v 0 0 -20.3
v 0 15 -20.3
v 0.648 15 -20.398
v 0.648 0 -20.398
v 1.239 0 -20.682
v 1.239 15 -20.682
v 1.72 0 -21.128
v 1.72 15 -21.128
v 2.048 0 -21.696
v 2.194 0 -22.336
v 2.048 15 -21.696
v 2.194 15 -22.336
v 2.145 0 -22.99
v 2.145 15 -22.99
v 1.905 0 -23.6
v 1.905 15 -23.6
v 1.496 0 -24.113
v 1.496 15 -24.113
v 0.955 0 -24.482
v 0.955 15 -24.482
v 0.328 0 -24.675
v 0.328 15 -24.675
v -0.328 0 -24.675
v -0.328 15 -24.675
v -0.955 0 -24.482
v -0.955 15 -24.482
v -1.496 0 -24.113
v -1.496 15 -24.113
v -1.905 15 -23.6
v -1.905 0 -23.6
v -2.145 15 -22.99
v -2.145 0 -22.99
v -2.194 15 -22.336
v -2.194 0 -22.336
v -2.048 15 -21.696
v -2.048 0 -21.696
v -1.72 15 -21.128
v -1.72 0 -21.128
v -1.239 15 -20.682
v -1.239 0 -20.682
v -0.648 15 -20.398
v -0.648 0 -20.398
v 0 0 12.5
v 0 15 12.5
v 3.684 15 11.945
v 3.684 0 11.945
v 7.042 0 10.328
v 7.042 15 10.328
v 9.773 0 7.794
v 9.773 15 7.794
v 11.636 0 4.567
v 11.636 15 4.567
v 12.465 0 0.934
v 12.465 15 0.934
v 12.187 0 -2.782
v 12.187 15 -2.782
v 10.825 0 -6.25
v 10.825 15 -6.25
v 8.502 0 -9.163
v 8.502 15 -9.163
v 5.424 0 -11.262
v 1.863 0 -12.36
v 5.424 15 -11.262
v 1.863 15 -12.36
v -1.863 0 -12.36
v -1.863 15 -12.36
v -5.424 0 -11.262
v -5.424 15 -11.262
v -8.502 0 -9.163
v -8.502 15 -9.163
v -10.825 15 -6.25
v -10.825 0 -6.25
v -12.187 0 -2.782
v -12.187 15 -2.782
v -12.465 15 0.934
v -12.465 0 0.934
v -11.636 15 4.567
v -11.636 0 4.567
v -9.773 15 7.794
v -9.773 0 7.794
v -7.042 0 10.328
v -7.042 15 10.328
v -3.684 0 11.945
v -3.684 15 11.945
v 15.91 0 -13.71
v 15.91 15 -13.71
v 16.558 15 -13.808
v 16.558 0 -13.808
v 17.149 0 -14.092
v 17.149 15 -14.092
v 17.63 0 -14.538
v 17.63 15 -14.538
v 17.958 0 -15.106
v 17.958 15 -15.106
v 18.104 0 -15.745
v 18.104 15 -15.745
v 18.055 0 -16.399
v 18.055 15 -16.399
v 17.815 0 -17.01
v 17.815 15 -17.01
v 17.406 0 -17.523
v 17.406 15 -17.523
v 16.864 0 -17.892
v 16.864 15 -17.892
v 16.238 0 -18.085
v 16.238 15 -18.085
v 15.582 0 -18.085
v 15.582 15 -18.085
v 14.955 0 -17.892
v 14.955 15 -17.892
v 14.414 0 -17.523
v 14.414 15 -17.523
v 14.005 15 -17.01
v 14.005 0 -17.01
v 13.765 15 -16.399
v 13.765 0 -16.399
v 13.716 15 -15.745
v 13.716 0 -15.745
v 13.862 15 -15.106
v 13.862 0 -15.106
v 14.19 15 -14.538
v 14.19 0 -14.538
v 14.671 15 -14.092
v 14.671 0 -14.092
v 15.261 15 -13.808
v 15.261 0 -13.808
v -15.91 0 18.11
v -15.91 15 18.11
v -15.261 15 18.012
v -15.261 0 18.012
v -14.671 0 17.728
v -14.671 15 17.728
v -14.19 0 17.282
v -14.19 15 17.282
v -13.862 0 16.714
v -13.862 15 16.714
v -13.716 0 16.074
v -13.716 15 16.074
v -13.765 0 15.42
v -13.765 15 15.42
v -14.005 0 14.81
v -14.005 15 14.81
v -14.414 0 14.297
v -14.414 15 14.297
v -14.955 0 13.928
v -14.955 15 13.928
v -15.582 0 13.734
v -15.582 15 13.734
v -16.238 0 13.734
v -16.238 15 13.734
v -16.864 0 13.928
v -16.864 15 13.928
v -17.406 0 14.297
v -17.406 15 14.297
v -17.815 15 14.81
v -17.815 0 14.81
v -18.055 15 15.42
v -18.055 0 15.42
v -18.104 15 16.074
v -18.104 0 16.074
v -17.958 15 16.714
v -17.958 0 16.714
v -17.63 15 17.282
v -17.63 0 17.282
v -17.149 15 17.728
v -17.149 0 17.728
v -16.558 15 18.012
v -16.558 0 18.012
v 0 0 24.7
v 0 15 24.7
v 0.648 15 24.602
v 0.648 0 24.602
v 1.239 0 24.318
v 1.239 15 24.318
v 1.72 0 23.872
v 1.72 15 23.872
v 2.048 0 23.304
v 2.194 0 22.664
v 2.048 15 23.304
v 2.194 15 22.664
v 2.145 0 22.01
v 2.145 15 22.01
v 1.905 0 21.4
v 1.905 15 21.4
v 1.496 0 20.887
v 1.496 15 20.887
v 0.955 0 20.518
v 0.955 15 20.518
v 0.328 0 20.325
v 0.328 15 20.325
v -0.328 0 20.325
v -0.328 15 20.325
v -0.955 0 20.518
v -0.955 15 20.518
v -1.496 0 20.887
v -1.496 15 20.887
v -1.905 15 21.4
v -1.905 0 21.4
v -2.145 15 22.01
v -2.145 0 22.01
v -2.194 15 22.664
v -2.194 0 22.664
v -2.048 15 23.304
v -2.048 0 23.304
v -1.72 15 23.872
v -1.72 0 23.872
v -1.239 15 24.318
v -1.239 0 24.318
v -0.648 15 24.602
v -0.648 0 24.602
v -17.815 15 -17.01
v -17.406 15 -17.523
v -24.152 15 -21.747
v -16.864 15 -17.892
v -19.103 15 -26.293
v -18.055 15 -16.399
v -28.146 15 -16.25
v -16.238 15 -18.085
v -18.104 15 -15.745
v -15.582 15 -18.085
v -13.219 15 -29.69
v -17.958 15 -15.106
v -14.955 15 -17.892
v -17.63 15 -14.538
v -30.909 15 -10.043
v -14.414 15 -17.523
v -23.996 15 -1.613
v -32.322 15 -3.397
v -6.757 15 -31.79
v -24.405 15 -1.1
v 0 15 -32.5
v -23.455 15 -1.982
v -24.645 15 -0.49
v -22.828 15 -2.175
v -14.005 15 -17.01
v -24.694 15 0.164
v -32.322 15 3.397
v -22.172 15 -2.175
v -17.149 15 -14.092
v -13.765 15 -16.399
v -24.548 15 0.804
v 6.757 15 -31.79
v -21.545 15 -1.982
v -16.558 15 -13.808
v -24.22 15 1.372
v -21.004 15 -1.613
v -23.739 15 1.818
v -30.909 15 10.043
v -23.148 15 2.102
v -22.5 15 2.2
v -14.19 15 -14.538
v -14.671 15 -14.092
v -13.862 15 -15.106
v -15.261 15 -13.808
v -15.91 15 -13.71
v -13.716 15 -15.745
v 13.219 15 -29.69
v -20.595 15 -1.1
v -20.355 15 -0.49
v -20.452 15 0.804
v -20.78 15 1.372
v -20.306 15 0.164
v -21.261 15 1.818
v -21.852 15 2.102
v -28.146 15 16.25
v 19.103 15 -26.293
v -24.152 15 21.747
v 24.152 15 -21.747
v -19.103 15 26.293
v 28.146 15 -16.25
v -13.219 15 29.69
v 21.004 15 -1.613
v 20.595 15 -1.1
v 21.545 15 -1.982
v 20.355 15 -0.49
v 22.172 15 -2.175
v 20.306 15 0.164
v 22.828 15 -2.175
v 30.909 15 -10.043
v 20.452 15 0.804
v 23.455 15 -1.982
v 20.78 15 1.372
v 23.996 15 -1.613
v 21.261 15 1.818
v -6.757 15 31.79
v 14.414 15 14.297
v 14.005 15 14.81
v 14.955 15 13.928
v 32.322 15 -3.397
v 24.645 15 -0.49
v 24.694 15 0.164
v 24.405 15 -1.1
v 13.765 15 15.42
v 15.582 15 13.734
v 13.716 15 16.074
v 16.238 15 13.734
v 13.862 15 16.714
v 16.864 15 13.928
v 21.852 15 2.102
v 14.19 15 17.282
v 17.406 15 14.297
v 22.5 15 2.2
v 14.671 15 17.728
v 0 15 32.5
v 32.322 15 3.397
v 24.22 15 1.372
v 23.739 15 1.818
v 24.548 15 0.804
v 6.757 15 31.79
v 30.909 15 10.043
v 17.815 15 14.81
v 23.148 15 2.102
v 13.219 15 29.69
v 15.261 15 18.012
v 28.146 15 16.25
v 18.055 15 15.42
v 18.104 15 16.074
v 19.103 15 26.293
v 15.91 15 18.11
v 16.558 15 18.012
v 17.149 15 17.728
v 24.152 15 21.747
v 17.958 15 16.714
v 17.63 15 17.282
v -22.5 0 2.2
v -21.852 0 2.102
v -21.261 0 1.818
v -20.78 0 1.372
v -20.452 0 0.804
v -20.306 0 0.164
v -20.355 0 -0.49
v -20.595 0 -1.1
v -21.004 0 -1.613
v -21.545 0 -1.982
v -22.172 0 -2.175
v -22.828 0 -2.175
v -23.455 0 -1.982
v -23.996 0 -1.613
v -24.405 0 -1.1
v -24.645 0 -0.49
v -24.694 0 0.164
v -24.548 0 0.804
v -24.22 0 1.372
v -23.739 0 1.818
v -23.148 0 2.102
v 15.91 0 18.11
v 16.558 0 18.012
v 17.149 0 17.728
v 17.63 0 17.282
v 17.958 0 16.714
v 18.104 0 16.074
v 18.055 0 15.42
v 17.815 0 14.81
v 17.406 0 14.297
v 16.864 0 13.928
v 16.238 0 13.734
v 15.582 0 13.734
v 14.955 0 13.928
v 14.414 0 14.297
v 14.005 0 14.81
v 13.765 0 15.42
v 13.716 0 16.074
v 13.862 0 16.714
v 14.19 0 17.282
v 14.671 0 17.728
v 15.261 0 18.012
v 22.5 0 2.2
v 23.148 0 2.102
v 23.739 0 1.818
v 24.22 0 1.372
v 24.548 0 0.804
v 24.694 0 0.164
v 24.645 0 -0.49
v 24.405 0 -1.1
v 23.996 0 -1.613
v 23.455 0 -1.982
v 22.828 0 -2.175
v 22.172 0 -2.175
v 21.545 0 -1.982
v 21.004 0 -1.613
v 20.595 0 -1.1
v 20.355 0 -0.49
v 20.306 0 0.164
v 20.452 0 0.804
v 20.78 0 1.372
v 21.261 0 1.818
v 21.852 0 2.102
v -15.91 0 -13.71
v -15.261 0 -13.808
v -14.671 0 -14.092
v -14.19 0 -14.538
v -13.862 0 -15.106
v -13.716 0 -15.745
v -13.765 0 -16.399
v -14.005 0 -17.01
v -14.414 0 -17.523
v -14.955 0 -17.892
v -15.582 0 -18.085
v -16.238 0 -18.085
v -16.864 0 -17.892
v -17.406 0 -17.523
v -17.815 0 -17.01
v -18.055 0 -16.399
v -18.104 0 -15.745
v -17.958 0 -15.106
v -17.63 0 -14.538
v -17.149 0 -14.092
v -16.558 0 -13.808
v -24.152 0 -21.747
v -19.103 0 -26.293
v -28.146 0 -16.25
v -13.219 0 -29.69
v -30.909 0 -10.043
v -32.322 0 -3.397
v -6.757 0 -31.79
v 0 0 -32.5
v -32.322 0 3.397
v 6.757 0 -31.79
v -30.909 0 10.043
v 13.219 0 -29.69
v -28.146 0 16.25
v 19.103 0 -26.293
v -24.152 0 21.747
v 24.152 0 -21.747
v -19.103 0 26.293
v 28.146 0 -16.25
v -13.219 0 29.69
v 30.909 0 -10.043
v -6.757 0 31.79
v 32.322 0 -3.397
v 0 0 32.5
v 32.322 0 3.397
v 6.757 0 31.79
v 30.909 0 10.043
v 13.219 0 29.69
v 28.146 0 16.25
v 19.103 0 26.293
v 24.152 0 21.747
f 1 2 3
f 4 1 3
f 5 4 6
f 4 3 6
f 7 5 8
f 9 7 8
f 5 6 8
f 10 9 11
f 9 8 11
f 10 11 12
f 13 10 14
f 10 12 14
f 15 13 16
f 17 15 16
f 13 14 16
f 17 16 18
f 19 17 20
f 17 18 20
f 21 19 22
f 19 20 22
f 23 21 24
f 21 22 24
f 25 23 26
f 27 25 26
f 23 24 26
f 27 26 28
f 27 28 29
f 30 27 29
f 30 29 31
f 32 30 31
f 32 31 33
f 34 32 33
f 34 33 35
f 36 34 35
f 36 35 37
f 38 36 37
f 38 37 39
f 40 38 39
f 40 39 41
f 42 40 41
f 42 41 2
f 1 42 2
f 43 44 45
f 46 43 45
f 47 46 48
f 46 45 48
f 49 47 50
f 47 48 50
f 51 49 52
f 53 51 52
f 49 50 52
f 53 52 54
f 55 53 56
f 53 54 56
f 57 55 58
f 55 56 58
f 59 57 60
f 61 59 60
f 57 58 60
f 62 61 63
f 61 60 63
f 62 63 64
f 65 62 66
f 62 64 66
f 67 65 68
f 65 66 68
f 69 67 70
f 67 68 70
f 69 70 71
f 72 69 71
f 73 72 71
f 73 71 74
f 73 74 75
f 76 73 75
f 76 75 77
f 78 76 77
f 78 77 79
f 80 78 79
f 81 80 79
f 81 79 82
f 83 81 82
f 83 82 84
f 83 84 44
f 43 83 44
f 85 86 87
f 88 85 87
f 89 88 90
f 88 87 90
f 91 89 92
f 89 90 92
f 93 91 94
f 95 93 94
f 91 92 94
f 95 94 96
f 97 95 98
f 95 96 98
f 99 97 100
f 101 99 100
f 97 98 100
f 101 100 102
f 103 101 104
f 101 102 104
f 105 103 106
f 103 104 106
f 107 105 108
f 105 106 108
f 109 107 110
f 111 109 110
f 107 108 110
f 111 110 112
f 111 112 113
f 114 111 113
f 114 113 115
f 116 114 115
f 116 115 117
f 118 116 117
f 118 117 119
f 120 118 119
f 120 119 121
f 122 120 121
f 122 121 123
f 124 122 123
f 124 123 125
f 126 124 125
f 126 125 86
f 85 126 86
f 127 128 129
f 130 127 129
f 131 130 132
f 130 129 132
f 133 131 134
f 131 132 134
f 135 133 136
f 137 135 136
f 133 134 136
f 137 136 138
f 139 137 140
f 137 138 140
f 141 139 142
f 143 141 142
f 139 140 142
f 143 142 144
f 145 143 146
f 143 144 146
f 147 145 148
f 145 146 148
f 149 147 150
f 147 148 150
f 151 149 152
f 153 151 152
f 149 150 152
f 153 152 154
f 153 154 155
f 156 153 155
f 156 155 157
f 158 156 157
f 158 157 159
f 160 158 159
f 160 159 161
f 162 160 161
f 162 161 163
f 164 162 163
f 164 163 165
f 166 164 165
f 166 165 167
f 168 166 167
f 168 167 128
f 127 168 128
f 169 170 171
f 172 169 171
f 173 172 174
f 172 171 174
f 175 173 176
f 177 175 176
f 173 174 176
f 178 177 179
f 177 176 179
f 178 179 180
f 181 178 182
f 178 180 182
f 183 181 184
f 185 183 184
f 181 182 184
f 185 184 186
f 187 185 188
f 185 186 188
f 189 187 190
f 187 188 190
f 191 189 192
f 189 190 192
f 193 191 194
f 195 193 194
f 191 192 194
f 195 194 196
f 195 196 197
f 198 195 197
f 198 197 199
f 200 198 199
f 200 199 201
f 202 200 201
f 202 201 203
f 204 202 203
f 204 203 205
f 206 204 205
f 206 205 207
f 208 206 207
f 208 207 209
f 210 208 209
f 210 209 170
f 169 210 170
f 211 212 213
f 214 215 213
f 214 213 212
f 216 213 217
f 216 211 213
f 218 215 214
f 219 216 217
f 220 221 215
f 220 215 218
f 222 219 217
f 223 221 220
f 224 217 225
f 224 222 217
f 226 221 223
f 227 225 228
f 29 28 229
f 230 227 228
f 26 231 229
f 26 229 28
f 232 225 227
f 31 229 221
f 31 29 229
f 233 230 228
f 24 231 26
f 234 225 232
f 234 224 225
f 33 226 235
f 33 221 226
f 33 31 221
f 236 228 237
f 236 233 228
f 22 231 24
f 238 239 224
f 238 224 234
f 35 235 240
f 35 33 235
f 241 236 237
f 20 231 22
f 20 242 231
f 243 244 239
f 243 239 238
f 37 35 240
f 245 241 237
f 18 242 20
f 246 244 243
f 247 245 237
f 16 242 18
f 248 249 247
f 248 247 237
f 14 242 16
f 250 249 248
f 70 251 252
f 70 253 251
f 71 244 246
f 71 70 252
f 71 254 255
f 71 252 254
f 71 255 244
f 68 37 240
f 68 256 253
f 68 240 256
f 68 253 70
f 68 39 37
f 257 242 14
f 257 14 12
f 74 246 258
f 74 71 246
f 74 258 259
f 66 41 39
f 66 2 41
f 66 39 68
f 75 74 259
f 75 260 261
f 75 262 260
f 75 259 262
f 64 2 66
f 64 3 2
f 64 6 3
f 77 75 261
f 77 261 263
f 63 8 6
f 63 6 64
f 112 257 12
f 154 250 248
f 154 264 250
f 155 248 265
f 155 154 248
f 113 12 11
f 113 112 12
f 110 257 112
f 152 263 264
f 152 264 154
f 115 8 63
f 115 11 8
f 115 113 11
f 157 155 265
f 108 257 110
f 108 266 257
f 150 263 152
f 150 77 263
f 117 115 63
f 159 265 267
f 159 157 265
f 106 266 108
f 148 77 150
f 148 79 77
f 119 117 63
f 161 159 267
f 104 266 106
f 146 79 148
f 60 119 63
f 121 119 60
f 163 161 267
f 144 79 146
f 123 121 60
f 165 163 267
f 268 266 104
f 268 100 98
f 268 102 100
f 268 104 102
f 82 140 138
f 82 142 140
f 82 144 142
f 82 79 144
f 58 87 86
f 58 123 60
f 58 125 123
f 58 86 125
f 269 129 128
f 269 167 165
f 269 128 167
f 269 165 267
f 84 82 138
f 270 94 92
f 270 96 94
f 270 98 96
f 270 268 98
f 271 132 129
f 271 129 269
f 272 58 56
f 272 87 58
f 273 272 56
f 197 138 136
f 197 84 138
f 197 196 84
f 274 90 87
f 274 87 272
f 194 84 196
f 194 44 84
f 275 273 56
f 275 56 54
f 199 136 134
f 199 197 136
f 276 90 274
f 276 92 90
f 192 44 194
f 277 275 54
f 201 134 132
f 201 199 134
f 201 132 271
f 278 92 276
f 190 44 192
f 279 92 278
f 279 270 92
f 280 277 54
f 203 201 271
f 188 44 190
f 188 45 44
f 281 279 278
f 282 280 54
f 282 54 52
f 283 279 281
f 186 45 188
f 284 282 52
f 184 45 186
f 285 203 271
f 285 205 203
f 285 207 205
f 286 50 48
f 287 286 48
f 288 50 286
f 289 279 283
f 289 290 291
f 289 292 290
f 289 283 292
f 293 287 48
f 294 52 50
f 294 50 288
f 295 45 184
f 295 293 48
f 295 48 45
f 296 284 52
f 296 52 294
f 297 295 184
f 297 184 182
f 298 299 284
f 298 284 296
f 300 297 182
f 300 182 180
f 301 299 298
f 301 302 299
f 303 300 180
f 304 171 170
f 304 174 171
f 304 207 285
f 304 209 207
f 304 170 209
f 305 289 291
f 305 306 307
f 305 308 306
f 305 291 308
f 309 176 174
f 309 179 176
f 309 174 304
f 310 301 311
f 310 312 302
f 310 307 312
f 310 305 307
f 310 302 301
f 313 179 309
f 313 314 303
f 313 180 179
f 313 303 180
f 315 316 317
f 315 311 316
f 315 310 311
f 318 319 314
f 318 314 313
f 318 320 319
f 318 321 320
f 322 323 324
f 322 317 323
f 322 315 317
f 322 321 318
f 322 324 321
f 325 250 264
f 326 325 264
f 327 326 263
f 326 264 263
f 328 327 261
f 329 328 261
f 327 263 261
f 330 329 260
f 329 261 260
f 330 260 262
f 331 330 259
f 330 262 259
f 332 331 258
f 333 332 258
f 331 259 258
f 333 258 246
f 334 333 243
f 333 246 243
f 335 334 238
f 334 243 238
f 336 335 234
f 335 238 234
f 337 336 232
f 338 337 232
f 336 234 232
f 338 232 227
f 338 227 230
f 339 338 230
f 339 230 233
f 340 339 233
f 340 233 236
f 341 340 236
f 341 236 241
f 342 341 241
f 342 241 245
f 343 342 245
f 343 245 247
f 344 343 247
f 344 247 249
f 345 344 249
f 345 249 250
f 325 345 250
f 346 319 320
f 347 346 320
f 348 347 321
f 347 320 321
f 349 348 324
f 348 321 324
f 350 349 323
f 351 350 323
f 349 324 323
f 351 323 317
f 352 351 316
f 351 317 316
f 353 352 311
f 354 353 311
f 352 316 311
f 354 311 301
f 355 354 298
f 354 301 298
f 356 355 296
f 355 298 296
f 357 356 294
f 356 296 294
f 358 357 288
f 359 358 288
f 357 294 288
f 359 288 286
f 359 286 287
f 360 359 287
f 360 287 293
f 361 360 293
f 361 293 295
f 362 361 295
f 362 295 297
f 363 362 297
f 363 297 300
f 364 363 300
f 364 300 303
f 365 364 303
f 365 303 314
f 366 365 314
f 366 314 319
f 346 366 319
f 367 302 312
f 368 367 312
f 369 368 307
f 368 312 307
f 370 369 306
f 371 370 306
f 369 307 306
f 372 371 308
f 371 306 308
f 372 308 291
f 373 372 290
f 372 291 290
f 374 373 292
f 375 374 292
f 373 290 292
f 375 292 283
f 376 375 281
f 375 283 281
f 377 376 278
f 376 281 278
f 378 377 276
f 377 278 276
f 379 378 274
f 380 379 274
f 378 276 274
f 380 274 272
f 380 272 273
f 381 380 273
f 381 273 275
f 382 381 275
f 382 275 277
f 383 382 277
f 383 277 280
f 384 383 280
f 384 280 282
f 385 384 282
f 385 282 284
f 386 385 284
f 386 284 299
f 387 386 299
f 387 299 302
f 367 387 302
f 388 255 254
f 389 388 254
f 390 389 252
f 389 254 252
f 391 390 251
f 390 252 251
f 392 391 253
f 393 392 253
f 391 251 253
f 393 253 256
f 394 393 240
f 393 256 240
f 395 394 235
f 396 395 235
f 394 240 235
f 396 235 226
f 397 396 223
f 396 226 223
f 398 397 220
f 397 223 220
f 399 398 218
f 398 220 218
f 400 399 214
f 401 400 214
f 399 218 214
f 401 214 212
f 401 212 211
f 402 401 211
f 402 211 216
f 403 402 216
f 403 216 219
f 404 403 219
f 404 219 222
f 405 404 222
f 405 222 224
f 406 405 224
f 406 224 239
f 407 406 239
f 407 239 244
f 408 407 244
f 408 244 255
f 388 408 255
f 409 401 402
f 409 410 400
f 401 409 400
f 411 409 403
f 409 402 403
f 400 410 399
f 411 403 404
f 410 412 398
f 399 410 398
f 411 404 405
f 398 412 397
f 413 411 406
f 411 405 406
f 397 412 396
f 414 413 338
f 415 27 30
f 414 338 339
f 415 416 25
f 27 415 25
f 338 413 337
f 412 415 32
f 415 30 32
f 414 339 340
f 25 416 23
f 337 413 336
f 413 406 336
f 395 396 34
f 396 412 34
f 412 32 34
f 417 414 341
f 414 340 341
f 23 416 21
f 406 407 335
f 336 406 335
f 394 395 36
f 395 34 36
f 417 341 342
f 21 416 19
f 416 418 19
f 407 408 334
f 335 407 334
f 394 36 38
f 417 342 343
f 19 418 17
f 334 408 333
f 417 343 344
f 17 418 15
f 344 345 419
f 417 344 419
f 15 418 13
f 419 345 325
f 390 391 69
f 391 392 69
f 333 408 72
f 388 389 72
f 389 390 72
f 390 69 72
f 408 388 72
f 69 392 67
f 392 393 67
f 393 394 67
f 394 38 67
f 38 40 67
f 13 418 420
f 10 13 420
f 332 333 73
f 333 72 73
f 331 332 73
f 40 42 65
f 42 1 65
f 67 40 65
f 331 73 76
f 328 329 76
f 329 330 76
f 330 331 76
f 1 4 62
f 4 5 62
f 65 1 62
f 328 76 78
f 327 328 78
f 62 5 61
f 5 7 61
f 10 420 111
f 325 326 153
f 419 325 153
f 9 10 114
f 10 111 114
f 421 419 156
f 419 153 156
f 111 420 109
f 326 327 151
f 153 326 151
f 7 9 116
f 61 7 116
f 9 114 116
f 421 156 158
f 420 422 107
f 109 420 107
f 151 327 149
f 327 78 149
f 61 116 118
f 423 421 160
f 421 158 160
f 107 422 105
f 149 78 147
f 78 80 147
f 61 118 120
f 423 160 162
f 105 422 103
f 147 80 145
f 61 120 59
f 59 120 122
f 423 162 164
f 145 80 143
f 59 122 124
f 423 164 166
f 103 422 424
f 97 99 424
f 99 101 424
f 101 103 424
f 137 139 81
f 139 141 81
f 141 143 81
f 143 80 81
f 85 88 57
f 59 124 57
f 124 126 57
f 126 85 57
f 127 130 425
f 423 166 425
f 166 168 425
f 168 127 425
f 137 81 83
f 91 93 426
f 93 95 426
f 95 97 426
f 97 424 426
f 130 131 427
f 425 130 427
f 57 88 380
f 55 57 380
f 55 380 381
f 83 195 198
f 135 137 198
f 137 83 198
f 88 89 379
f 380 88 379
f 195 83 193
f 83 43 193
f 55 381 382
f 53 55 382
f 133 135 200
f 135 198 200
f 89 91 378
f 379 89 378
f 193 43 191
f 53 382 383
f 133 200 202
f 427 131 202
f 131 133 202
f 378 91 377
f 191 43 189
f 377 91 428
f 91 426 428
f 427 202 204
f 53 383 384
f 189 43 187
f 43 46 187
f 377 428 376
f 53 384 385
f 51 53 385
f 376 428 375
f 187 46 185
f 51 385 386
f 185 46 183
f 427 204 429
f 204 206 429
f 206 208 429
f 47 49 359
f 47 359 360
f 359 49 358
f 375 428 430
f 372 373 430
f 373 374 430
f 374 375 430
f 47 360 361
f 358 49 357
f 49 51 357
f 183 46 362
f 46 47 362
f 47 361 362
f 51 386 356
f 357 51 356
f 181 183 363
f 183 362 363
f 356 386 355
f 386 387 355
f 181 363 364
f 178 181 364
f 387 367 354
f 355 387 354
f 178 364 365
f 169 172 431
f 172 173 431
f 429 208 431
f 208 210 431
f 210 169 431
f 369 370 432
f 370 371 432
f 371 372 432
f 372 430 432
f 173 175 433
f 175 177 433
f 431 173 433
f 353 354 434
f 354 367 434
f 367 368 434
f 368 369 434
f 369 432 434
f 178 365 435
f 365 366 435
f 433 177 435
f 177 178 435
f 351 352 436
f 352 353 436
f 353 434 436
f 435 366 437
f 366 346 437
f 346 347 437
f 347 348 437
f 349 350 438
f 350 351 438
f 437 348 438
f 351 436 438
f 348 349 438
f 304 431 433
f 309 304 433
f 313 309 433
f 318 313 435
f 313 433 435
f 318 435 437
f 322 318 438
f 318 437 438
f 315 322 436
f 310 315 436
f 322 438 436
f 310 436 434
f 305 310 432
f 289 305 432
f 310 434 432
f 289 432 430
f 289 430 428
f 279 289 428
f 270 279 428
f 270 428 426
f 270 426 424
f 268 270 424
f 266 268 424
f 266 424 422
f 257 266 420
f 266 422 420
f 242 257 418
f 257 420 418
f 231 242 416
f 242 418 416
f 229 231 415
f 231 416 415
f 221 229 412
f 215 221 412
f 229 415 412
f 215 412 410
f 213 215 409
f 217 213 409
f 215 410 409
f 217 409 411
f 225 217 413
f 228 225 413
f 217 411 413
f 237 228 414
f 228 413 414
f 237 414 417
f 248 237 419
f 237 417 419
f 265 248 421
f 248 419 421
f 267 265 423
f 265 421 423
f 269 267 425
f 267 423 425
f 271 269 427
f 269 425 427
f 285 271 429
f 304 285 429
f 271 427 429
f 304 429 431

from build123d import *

# Parameters (mm, degrees)
SKETCH1_R           = 32.5
BOSS_EXTRUDE1_DEPTH = 15
SKETCH2_R           = 2.2
CUT_EXTRUDE1_DEPTH  = 49.347699015
SKETCH3_R           = 12.5
CUT_EXTRUDE2_DEPTH  = 49.347699015


with BuildPart() as part:
    # Sketch1 → Boss-Extrude1 (new body)
    with BuildSketch(Plane(origin=(0, 0, 0), x_dir=(1, 0, 0), z_dir=(0, 1, 0))):
        with Locations(Location((0, 0, 0), (0, 0, 270))):
            Circle(SKETCH1_R)
    extrude(amount=BOSS_EXTRUDE1_DEPTH)

    # Sketch2 → Cut-Extrude1 (cut, through all)
    with BuildSketch(Plane(origin=(0, 15, 0), x_dir=(1, 0, 0), z_dir=(0, 1, 0))):
        with Locations(Location((0, 22.5, 0), (0, 0, 270))):
            Circle(SKETCH2_R)
        with Locations(Location((15.909902577, 15.909902577, 0), (0, 0, 270))):
            Circle(SKETCH2_R)
        with Locations(Location((22.5, 0, 0), (0, 0, 270))):
            Circle(SKETCH2_R)
        with Locations(Location((15.909902577, -15.909902577, 0), (0, 0, 270))):
            Circle(SKETCH2_R)
        with Locations(Location((0, -22.5, 0), (0, 0, 270))):
            Circle(SKETCH2_R)
        with Locations(Location((-15.909902577, -15.909902577, 0), (0, 0, 270))):
            Circle(SKETCH2_R)
        with Locations(Location((-22.5, 0, 0), (0, 0, 270))):
            Circle(SKETCH2_R)
        with Locations(Location((-15.909902577, 15.909902577, 0), (0, 0, 270))):
            Circle(SKETCH2_R)
    extrude(amount=-CUT_EXTRUDE1_DEPTH, mode=Mode.SUBTRACT)

    # Sketch3 → Cut-Extrude2 (cut, through all)
    with BuildSketch(Plane(origin=(0, 15, 0), x_dir=(1, 0, 0), z_dir=(0, 1, 0))):
        with Locations(Location((0, 0, 0), (0, 0, 270))):
            Circle(SKETCH3_R)
    extrude(amount=-CUT_EXTRUDE2_DEPTH, mode=Mode.SUBTRACT)


solid = part.part
